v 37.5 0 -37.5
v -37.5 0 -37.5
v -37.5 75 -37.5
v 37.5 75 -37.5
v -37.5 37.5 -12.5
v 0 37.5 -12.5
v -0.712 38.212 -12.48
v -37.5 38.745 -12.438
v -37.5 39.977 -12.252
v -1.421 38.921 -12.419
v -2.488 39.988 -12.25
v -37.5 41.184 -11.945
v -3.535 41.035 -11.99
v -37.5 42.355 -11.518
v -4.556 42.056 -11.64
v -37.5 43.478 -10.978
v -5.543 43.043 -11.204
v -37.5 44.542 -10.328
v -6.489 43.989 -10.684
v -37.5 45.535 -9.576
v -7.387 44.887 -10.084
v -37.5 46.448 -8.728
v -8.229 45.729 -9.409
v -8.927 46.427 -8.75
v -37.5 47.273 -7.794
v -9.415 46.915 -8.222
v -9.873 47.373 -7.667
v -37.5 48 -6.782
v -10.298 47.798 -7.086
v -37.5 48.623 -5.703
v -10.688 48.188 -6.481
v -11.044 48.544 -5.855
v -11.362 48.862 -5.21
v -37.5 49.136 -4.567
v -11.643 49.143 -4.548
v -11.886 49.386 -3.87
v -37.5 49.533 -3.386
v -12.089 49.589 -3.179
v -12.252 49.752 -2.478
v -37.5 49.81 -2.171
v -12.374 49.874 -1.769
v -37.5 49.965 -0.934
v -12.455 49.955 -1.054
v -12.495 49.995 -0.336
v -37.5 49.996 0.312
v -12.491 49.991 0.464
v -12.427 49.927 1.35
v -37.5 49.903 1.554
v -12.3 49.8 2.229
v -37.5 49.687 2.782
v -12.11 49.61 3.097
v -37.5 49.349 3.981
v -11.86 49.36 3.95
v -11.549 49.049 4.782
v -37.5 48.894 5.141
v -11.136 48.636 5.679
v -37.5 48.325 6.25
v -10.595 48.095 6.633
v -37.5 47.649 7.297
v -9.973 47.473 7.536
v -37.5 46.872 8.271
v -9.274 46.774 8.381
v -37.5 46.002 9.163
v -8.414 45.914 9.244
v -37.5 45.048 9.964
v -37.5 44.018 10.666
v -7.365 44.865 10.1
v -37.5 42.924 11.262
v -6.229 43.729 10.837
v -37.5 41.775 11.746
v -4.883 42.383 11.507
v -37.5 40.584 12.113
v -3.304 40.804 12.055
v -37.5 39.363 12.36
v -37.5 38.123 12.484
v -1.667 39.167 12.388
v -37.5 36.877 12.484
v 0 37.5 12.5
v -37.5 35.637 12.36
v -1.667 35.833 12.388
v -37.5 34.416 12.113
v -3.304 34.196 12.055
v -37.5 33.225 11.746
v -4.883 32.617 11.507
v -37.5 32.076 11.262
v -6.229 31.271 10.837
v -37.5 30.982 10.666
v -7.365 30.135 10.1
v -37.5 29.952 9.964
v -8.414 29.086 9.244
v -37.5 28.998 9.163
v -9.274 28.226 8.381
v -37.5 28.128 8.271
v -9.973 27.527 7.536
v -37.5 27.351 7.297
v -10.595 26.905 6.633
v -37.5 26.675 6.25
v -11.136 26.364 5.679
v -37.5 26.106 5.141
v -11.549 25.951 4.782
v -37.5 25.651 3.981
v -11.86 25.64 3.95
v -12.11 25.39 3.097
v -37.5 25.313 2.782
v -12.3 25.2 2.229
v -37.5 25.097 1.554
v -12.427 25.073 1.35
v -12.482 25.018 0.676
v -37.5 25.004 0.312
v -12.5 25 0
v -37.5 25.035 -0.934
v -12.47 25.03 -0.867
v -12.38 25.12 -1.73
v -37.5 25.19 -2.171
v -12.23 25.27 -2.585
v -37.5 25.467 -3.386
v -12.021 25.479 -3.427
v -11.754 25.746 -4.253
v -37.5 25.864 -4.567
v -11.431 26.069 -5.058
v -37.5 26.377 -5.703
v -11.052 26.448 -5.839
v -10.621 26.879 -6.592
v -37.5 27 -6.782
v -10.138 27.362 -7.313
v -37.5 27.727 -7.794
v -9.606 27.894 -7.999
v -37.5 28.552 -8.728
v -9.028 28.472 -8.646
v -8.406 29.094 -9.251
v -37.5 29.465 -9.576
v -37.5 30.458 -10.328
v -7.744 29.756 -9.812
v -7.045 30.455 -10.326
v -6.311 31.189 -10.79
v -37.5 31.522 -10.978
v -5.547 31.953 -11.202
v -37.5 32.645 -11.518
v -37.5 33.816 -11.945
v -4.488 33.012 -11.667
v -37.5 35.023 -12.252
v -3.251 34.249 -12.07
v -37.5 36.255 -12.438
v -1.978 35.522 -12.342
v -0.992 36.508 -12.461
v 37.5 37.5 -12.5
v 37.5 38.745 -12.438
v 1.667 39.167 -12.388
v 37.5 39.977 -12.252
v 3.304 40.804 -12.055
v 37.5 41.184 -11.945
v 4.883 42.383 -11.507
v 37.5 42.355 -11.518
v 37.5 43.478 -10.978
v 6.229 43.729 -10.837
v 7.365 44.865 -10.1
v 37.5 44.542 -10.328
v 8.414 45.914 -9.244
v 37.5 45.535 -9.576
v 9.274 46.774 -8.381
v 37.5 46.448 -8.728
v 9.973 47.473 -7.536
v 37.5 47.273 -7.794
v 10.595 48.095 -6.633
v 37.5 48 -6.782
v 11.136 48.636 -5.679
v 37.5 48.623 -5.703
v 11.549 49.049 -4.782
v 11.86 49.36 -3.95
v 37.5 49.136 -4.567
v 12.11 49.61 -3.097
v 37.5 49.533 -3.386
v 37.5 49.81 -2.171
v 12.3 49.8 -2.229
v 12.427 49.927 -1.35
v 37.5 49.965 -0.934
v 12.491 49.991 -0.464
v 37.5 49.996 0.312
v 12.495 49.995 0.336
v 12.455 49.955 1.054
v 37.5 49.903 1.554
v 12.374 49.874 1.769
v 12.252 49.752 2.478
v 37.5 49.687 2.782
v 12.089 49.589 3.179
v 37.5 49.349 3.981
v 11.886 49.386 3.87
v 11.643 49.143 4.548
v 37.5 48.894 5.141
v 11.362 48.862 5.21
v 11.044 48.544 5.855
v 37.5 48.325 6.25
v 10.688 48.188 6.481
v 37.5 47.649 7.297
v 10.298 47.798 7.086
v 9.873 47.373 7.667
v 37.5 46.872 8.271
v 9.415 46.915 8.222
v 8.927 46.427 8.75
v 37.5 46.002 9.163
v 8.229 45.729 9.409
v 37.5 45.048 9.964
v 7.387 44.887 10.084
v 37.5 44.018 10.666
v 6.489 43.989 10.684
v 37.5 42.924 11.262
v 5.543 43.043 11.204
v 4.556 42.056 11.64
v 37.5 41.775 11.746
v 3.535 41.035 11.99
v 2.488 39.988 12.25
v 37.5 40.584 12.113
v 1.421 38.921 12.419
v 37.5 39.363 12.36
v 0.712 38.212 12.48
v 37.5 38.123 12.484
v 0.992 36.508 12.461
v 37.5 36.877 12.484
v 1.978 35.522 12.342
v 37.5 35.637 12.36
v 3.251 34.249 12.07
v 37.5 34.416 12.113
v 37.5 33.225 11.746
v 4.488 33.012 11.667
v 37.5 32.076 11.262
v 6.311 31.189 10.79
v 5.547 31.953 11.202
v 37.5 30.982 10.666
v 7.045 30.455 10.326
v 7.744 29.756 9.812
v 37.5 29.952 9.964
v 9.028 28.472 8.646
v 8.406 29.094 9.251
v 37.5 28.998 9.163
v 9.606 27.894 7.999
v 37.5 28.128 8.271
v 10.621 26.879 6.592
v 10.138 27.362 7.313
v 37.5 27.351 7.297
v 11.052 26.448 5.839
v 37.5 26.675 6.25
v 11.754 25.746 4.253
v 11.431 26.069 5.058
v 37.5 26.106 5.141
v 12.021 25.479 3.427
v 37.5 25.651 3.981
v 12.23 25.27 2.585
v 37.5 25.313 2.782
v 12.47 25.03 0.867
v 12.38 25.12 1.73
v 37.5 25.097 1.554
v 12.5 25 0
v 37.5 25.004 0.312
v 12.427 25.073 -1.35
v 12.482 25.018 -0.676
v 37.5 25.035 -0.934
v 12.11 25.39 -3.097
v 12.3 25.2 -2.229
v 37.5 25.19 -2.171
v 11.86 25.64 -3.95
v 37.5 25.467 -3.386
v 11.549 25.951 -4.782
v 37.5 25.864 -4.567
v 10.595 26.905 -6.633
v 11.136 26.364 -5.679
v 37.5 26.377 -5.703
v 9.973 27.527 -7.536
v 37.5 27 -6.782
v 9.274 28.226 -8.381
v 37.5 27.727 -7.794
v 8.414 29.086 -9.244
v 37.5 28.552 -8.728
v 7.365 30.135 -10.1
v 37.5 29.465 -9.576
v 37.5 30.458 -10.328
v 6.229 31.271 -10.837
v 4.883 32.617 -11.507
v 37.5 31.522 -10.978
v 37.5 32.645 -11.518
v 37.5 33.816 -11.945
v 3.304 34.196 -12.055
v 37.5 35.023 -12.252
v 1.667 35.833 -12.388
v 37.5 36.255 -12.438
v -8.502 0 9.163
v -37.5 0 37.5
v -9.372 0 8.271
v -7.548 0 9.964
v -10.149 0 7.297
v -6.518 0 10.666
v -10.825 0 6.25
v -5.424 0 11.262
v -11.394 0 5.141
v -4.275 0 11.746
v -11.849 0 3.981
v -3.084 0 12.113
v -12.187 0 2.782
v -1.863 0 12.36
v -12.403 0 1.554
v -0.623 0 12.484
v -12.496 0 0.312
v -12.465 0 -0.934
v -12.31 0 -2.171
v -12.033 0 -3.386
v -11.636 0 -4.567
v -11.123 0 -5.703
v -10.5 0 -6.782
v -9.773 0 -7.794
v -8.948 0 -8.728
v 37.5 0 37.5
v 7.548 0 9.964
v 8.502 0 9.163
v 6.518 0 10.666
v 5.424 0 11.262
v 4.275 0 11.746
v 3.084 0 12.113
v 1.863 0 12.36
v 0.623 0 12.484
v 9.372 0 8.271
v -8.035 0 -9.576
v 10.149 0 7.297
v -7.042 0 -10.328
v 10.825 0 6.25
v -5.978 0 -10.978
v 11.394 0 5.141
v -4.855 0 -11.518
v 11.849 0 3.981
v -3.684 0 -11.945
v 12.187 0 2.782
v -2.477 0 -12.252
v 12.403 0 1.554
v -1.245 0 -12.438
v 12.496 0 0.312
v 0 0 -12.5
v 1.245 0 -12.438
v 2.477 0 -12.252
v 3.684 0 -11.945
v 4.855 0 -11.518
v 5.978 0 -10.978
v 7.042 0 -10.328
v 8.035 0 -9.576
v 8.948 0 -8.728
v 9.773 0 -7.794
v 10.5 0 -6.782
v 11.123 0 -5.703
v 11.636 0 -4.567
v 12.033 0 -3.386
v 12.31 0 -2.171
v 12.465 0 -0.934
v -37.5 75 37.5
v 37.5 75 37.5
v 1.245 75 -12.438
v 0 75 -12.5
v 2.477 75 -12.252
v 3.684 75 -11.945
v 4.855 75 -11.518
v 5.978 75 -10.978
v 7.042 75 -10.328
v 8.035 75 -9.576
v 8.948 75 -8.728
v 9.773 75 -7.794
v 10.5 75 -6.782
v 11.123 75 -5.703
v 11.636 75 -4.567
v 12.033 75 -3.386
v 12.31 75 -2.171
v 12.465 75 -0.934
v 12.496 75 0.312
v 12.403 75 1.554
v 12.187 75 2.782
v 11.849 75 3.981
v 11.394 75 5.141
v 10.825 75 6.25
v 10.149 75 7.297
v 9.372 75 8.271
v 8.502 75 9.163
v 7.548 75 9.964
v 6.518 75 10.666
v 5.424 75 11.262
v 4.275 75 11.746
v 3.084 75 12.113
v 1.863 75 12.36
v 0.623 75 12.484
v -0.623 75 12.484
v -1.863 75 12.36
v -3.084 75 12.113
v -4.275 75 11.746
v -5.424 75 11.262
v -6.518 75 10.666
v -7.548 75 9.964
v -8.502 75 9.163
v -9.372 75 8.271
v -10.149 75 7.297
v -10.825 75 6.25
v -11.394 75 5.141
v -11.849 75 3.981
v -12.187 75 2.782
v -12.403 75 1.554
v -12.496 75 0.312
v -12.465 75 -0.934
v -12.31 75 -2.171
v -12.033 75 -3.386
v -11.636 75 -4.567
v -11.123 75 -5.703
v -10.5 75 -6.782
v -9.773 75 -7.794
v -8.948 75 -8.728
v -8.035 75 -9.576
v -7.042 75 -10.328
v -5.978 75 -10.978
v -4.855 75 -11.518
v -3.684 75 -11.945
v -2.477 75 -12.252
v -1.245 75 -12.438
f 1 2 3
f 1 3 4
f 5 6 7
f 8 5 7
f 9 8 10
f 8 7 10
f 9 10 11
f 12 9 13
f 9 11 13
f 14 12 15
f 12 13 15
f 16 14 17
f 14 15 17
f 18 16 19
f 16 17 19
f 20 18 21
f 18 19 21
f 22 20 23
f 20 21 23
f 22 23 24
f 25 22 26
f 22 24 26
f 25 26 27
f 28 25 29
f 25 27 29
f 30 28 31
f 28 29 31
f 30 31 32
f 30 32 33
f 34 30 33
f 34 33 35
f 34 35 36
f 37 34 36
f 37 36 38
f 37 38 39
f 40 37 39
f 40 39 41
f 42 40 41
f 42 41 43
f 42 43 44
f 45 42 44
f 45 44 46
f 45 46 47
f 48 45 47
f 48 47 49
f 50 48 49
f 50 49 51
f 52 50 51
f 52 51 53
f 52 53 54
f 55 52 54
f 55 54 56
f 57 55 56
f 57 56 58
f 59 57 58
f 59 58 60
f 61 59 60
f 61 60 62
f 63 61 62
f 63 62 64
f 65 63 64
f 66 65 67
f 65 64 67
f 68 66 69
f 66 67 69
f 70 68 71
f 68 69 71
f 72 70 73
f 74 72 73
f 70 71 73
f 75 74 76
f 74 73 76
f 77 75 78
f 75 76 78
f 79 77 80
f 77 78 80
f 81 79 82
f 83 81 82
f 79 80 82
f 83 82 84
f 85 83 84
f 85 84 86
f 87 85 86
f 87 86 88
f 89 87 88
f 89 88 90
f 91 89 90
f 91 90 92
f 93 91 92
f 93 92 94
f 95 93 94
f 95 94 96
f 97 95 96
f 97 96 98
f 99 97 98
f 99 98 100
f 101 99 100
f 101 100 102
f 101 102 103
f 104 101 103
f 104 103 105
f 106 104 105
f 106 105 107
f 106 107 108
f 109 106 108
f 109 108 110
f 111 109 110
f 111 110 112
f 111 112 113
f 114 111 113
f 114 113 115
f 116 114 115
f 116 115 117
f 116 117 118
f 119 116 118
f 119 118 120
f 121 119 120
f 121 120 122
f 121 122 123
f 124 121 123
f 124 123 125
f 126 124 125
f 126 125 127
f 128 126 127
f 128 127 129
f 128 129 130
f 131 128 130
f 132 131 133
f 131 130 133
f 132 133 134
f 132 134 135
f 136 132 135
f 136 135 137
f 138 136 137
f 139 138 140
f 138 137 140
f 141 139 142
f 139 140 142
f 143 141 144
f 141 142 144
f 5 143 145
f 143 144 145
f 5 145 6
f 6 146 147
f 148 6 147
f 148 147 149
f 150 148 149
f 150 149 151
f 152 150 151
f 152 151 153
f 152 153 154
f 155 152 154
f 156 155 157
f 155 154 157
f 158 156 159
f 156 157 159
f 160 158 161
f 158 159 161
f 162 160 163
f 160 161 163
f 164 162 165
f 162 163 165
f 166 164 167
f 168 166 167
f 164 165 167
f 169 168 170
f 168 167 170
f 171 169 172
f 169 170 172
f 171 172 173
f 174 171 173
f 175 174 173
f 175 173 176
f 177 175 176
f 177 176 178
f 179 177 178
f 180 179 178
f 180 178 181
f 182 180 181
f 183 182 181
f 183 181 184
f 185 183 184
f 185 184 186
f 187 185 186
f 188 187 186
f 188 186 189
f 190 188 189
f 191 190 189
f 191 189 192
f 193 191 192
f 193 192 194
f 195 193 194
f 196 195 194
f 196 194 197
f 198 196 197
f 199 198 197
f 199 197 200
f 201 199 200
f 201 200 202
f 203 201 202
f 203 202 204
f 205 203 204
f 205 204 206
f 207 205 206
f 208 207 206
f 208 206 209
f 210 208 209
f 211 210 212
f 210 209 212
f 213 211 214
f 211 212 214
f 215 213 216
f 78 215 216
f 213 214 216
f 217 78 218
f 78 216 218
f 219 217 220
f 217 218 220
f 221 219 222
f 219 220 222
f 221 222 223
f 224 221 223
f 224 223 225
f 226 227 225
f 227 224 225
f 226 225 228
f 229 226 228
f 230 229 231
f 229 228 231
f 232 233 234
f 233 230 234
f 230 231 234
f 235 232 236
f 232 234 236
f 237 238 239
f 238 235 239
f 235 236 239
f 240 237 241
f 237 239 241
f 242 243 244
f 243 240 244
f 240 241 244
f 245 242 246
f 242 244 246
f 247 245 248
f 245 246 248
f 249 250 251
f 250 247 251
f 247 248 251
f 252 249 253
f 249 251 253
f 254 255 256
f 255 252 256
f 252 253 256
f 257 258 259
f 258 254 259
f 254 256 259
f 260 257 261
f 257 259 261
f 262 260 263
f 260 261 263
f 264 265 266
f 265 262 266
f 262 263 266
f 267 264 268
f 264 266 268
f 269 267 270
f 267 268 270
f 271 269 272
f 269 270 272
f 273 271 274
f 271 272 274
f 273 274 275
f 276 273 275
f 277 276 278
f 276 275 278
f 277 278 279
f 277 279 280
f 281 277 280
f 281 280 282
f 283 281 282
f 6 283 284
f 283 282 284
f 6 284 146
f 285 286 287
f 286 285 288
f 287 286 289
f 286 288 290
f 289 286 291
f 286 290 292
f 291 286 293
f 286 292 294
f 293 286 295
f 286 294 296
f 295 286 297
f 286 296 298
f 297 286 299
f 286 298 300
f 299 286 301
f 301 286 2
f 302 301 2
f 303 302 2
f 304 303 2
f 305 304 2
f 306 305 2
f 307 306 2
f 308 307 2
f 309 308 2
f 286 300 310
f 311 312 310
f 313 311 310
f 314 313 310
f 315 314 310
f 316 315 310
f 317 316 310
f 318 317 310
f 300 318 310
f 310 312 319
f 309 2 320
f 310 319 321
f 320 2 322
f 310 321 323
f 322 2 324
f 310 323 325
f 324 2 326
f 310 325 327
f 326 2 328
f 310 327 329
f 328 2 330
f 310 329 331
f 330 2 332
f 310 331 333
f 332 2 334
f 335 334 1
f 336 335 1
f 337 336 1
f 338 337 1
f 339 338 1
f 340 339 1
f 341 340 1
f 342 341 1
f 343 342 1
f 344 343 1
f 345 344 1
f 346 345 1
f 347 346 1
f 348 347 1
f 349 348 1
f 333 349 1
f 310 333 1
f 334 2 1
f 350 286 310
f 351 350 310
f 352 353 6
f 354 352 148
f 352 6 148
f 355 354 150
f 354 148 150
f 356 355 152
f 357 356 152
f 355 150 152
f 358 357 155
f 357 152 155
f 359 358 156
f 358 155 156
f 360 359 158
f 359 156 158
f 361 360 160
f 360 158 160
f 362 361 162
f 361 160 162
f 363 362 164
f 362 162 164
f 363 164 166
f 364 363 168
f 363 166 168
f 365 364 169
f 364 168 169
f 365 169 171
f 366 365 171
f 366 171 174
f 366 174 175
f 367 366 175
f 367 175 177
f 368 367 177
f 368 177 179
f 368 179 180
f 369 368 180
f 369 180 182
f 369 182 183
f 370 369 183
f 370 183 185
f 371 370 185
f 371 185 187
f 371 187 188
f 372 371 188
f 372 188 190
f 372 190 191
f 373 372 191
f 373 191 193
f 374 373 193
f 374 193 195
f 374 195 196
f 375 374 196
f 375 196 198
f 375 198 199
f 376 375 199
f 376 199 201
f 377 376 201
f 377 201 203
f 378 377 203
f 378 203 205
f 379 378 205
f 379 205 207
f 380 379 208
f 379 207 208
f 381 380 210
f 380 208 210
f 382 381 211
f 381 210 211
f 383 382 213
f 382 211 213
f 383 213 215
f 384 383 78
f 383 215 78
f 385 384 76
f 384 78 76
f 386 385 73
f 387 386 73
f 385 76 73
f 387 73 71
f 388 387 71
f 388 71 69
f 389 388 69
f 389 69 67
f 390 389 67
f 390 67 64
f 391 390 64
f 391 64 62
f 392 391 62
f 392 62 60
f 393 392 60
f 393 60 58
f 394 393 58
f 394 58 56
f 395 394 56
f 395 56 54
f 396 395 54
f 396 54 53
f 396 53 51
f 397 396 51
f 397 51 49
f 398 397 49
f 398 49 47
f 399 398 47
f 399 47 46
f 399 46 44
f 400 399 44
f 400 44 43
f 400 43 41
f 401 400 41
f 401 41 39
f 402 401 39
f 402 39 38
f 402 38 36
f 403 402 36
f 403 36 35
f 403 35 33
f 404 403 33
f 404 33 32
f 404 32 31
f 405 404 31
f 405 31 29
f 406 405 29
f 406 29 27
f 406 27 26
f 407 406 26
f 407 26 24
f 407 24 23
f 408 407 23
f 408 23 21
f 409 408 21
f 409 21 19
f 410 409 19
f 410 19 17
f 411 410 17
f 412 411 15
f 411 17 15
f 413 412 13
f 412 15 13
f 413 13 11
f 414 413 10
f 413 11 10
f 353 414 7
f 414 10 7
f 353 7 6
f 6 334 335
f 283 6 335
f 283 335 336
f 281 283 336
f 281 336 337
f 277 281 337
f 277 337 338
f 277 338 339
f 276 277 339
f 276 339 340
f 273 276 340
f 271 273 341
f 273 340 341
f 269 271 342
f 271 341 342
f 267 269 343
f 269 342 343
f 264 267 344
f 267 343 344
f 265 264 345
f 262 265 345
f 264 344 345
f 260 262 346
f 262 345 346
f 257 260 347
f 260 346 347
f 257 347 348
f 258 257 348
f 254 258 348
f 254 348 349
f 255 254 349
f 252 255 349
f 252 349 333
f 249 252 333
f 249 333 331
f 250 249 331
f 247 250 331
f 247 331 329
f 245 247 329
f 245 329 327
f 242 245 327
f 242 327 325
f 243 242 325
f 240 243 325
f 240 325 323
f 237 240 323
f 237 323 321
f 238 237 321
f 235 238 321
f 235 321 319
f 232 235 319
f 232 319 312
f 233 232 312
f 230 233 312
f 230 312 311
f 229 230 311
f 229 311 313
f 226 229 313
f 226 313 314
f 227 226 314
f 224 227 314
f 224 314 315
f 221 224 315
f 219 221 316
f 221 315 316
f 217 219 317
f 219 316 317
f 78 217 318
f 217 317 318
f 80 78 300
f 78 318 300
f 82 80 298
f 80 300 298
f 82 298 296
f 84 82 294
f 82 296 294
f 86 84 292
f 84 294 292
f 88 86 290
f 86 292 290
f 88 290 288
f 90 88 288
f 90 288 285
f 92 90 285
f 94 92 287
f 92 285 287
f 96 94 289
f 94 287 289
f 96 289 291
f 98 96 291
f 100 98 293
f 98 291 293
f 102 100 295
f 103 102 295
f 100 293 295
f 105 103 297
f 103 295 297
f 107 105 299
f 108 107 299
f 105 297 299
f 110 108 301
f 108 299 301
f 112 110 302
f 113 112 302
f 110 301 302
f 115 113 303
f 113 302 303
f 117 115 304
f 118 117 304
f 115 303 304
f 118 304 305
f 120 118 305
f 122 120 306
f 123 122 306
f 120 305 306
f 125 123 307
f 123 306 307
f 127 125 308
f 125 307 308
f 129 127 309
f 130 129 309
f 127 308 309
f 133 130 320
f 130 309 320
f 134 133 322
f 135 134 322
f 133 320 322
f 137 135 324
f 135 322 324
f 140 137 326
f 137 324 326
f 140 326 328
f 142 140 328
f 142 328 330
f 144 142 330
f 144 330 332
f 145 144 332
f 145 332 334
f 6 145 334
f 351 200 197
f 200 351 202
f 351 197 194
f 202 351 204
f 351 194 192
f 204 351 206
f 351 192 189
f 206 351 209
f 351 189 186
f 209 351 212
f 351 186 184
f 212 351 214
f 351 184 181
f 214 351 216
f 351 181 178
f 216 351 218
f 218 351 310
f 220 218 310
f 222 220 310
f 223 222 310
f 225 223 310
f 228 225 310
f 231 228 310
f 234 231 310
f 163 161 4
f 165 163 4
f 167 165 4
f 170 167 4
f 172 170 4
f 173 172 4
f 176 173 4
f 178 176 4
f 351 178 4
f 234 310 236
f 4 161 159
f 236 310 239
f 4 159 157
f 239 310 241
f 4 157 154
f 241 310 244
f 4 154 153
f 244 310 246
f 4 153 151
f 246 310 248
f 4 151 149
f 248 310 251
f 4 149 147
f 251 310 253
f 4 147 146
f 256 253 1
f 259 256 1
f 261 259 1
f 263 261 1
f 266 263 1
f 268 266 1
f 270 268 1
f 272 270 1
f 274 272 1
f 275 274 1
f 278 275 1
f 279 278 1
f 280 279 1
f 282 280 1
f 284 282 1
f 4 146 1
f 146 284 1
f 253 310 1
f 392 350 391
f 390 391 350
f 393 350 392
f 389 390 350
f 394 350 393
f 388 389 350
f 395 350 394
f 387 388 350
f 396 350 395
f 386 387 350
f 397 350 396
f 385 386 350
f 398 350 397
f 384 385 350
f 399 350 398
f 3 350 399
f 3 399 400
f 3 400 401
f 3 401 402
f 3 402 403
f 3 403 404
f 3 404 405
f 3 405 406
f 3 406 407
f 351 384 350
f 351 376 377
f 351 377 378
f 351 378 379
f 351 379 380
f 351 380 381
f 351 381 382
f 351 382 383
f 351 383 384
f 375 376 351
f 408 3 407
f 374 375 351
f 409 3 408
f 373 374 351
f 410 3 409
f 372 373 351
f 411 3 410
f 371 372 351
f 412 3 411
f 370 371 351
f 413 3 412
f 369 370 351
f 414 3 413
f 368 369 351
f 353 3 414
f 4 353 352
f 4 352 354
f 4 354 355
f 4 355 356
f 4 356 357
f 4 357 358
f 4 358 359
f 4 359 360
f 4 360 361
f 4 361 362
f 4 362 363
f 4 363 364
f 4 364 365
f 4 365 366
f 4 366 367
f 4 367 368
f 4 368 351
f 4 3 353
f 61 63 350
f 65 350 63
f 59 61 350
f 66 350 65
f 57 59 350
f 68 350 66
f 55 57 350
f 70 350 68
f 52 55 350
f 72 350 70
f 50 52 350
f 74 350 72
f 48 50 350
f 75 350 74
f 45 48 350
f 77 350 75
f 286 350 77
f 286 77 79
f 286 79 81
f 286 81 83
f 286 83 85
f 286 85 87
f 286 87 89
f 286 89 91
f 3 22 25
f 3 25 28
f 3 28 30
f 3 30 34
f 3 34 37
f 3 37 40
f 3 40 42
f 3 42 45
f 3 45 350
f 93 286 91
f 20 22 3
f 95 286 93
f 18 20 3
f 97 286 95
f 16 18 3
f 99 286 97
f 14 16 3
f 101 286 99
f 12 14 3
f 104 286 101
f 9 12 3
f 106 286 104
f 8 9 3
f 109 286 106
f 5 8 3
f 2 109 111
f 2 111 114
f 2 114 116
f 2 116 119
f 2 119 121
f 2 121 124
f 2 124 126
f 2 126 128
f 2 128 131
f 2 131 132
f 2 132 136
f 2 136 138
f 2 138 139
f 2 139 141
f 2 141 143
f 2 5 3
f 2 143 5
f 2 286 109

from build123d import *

# Parameters (mm, degrees)
SKETCH1_W           = 75
SKETCH1_H           = 75
BOSS_EXTRUDE1_DEPTH = 75
SKETCH2_R           = 12.5
CUT_EXTRUDE1_DEPTH  = 92.855865354
SKETCH5_R           = 12.5
CUT_EXTRUDE2_DEPTH  = 113.5


with BuildPart() as part:
    # Sketch1 → Boss-Extrude1 (new body)
    with BuildSketch(Plane(origin=(0, 0, 0), x_dir=(1, 0, 0), z_dir=(0, 1, 0))):
        Rectangle(SKETCH1_W, SKETCH1_H)
    extrude(amount=BOSS_EXTRUDE1_DEPTH)

    # Sketch2 → Cut-Extrude1 (cut, through all)
    with BuildSketch(Plane(origin=(0, 0, 0), x_dir=(-1, 0, 0), z_dir=(0, -1, 0))):
        with Locations(Location((0, 0, 0), (0, 0, 90))):
            Circle(SKETCH2_R)
    extrude(amount=-CUT_EXTRUDE1_DEPTH, mode=Mode.SUBTRACT)

    # Sketch5 → Cut-Extrude2 (cut, through all)
    with BuildSketch(Plane(origin=(37.5, 0, 0), x_dir=(0, 0, -1), z_dir=(1, 0, 0))):
        with Locations((0, 37.5)):
            Circle(SKETCH5_R)
    extrude(amount=-CUT_EXTRUDE2_DEPTH, mode=Mode.SUBTRACT)


solid = part.part
